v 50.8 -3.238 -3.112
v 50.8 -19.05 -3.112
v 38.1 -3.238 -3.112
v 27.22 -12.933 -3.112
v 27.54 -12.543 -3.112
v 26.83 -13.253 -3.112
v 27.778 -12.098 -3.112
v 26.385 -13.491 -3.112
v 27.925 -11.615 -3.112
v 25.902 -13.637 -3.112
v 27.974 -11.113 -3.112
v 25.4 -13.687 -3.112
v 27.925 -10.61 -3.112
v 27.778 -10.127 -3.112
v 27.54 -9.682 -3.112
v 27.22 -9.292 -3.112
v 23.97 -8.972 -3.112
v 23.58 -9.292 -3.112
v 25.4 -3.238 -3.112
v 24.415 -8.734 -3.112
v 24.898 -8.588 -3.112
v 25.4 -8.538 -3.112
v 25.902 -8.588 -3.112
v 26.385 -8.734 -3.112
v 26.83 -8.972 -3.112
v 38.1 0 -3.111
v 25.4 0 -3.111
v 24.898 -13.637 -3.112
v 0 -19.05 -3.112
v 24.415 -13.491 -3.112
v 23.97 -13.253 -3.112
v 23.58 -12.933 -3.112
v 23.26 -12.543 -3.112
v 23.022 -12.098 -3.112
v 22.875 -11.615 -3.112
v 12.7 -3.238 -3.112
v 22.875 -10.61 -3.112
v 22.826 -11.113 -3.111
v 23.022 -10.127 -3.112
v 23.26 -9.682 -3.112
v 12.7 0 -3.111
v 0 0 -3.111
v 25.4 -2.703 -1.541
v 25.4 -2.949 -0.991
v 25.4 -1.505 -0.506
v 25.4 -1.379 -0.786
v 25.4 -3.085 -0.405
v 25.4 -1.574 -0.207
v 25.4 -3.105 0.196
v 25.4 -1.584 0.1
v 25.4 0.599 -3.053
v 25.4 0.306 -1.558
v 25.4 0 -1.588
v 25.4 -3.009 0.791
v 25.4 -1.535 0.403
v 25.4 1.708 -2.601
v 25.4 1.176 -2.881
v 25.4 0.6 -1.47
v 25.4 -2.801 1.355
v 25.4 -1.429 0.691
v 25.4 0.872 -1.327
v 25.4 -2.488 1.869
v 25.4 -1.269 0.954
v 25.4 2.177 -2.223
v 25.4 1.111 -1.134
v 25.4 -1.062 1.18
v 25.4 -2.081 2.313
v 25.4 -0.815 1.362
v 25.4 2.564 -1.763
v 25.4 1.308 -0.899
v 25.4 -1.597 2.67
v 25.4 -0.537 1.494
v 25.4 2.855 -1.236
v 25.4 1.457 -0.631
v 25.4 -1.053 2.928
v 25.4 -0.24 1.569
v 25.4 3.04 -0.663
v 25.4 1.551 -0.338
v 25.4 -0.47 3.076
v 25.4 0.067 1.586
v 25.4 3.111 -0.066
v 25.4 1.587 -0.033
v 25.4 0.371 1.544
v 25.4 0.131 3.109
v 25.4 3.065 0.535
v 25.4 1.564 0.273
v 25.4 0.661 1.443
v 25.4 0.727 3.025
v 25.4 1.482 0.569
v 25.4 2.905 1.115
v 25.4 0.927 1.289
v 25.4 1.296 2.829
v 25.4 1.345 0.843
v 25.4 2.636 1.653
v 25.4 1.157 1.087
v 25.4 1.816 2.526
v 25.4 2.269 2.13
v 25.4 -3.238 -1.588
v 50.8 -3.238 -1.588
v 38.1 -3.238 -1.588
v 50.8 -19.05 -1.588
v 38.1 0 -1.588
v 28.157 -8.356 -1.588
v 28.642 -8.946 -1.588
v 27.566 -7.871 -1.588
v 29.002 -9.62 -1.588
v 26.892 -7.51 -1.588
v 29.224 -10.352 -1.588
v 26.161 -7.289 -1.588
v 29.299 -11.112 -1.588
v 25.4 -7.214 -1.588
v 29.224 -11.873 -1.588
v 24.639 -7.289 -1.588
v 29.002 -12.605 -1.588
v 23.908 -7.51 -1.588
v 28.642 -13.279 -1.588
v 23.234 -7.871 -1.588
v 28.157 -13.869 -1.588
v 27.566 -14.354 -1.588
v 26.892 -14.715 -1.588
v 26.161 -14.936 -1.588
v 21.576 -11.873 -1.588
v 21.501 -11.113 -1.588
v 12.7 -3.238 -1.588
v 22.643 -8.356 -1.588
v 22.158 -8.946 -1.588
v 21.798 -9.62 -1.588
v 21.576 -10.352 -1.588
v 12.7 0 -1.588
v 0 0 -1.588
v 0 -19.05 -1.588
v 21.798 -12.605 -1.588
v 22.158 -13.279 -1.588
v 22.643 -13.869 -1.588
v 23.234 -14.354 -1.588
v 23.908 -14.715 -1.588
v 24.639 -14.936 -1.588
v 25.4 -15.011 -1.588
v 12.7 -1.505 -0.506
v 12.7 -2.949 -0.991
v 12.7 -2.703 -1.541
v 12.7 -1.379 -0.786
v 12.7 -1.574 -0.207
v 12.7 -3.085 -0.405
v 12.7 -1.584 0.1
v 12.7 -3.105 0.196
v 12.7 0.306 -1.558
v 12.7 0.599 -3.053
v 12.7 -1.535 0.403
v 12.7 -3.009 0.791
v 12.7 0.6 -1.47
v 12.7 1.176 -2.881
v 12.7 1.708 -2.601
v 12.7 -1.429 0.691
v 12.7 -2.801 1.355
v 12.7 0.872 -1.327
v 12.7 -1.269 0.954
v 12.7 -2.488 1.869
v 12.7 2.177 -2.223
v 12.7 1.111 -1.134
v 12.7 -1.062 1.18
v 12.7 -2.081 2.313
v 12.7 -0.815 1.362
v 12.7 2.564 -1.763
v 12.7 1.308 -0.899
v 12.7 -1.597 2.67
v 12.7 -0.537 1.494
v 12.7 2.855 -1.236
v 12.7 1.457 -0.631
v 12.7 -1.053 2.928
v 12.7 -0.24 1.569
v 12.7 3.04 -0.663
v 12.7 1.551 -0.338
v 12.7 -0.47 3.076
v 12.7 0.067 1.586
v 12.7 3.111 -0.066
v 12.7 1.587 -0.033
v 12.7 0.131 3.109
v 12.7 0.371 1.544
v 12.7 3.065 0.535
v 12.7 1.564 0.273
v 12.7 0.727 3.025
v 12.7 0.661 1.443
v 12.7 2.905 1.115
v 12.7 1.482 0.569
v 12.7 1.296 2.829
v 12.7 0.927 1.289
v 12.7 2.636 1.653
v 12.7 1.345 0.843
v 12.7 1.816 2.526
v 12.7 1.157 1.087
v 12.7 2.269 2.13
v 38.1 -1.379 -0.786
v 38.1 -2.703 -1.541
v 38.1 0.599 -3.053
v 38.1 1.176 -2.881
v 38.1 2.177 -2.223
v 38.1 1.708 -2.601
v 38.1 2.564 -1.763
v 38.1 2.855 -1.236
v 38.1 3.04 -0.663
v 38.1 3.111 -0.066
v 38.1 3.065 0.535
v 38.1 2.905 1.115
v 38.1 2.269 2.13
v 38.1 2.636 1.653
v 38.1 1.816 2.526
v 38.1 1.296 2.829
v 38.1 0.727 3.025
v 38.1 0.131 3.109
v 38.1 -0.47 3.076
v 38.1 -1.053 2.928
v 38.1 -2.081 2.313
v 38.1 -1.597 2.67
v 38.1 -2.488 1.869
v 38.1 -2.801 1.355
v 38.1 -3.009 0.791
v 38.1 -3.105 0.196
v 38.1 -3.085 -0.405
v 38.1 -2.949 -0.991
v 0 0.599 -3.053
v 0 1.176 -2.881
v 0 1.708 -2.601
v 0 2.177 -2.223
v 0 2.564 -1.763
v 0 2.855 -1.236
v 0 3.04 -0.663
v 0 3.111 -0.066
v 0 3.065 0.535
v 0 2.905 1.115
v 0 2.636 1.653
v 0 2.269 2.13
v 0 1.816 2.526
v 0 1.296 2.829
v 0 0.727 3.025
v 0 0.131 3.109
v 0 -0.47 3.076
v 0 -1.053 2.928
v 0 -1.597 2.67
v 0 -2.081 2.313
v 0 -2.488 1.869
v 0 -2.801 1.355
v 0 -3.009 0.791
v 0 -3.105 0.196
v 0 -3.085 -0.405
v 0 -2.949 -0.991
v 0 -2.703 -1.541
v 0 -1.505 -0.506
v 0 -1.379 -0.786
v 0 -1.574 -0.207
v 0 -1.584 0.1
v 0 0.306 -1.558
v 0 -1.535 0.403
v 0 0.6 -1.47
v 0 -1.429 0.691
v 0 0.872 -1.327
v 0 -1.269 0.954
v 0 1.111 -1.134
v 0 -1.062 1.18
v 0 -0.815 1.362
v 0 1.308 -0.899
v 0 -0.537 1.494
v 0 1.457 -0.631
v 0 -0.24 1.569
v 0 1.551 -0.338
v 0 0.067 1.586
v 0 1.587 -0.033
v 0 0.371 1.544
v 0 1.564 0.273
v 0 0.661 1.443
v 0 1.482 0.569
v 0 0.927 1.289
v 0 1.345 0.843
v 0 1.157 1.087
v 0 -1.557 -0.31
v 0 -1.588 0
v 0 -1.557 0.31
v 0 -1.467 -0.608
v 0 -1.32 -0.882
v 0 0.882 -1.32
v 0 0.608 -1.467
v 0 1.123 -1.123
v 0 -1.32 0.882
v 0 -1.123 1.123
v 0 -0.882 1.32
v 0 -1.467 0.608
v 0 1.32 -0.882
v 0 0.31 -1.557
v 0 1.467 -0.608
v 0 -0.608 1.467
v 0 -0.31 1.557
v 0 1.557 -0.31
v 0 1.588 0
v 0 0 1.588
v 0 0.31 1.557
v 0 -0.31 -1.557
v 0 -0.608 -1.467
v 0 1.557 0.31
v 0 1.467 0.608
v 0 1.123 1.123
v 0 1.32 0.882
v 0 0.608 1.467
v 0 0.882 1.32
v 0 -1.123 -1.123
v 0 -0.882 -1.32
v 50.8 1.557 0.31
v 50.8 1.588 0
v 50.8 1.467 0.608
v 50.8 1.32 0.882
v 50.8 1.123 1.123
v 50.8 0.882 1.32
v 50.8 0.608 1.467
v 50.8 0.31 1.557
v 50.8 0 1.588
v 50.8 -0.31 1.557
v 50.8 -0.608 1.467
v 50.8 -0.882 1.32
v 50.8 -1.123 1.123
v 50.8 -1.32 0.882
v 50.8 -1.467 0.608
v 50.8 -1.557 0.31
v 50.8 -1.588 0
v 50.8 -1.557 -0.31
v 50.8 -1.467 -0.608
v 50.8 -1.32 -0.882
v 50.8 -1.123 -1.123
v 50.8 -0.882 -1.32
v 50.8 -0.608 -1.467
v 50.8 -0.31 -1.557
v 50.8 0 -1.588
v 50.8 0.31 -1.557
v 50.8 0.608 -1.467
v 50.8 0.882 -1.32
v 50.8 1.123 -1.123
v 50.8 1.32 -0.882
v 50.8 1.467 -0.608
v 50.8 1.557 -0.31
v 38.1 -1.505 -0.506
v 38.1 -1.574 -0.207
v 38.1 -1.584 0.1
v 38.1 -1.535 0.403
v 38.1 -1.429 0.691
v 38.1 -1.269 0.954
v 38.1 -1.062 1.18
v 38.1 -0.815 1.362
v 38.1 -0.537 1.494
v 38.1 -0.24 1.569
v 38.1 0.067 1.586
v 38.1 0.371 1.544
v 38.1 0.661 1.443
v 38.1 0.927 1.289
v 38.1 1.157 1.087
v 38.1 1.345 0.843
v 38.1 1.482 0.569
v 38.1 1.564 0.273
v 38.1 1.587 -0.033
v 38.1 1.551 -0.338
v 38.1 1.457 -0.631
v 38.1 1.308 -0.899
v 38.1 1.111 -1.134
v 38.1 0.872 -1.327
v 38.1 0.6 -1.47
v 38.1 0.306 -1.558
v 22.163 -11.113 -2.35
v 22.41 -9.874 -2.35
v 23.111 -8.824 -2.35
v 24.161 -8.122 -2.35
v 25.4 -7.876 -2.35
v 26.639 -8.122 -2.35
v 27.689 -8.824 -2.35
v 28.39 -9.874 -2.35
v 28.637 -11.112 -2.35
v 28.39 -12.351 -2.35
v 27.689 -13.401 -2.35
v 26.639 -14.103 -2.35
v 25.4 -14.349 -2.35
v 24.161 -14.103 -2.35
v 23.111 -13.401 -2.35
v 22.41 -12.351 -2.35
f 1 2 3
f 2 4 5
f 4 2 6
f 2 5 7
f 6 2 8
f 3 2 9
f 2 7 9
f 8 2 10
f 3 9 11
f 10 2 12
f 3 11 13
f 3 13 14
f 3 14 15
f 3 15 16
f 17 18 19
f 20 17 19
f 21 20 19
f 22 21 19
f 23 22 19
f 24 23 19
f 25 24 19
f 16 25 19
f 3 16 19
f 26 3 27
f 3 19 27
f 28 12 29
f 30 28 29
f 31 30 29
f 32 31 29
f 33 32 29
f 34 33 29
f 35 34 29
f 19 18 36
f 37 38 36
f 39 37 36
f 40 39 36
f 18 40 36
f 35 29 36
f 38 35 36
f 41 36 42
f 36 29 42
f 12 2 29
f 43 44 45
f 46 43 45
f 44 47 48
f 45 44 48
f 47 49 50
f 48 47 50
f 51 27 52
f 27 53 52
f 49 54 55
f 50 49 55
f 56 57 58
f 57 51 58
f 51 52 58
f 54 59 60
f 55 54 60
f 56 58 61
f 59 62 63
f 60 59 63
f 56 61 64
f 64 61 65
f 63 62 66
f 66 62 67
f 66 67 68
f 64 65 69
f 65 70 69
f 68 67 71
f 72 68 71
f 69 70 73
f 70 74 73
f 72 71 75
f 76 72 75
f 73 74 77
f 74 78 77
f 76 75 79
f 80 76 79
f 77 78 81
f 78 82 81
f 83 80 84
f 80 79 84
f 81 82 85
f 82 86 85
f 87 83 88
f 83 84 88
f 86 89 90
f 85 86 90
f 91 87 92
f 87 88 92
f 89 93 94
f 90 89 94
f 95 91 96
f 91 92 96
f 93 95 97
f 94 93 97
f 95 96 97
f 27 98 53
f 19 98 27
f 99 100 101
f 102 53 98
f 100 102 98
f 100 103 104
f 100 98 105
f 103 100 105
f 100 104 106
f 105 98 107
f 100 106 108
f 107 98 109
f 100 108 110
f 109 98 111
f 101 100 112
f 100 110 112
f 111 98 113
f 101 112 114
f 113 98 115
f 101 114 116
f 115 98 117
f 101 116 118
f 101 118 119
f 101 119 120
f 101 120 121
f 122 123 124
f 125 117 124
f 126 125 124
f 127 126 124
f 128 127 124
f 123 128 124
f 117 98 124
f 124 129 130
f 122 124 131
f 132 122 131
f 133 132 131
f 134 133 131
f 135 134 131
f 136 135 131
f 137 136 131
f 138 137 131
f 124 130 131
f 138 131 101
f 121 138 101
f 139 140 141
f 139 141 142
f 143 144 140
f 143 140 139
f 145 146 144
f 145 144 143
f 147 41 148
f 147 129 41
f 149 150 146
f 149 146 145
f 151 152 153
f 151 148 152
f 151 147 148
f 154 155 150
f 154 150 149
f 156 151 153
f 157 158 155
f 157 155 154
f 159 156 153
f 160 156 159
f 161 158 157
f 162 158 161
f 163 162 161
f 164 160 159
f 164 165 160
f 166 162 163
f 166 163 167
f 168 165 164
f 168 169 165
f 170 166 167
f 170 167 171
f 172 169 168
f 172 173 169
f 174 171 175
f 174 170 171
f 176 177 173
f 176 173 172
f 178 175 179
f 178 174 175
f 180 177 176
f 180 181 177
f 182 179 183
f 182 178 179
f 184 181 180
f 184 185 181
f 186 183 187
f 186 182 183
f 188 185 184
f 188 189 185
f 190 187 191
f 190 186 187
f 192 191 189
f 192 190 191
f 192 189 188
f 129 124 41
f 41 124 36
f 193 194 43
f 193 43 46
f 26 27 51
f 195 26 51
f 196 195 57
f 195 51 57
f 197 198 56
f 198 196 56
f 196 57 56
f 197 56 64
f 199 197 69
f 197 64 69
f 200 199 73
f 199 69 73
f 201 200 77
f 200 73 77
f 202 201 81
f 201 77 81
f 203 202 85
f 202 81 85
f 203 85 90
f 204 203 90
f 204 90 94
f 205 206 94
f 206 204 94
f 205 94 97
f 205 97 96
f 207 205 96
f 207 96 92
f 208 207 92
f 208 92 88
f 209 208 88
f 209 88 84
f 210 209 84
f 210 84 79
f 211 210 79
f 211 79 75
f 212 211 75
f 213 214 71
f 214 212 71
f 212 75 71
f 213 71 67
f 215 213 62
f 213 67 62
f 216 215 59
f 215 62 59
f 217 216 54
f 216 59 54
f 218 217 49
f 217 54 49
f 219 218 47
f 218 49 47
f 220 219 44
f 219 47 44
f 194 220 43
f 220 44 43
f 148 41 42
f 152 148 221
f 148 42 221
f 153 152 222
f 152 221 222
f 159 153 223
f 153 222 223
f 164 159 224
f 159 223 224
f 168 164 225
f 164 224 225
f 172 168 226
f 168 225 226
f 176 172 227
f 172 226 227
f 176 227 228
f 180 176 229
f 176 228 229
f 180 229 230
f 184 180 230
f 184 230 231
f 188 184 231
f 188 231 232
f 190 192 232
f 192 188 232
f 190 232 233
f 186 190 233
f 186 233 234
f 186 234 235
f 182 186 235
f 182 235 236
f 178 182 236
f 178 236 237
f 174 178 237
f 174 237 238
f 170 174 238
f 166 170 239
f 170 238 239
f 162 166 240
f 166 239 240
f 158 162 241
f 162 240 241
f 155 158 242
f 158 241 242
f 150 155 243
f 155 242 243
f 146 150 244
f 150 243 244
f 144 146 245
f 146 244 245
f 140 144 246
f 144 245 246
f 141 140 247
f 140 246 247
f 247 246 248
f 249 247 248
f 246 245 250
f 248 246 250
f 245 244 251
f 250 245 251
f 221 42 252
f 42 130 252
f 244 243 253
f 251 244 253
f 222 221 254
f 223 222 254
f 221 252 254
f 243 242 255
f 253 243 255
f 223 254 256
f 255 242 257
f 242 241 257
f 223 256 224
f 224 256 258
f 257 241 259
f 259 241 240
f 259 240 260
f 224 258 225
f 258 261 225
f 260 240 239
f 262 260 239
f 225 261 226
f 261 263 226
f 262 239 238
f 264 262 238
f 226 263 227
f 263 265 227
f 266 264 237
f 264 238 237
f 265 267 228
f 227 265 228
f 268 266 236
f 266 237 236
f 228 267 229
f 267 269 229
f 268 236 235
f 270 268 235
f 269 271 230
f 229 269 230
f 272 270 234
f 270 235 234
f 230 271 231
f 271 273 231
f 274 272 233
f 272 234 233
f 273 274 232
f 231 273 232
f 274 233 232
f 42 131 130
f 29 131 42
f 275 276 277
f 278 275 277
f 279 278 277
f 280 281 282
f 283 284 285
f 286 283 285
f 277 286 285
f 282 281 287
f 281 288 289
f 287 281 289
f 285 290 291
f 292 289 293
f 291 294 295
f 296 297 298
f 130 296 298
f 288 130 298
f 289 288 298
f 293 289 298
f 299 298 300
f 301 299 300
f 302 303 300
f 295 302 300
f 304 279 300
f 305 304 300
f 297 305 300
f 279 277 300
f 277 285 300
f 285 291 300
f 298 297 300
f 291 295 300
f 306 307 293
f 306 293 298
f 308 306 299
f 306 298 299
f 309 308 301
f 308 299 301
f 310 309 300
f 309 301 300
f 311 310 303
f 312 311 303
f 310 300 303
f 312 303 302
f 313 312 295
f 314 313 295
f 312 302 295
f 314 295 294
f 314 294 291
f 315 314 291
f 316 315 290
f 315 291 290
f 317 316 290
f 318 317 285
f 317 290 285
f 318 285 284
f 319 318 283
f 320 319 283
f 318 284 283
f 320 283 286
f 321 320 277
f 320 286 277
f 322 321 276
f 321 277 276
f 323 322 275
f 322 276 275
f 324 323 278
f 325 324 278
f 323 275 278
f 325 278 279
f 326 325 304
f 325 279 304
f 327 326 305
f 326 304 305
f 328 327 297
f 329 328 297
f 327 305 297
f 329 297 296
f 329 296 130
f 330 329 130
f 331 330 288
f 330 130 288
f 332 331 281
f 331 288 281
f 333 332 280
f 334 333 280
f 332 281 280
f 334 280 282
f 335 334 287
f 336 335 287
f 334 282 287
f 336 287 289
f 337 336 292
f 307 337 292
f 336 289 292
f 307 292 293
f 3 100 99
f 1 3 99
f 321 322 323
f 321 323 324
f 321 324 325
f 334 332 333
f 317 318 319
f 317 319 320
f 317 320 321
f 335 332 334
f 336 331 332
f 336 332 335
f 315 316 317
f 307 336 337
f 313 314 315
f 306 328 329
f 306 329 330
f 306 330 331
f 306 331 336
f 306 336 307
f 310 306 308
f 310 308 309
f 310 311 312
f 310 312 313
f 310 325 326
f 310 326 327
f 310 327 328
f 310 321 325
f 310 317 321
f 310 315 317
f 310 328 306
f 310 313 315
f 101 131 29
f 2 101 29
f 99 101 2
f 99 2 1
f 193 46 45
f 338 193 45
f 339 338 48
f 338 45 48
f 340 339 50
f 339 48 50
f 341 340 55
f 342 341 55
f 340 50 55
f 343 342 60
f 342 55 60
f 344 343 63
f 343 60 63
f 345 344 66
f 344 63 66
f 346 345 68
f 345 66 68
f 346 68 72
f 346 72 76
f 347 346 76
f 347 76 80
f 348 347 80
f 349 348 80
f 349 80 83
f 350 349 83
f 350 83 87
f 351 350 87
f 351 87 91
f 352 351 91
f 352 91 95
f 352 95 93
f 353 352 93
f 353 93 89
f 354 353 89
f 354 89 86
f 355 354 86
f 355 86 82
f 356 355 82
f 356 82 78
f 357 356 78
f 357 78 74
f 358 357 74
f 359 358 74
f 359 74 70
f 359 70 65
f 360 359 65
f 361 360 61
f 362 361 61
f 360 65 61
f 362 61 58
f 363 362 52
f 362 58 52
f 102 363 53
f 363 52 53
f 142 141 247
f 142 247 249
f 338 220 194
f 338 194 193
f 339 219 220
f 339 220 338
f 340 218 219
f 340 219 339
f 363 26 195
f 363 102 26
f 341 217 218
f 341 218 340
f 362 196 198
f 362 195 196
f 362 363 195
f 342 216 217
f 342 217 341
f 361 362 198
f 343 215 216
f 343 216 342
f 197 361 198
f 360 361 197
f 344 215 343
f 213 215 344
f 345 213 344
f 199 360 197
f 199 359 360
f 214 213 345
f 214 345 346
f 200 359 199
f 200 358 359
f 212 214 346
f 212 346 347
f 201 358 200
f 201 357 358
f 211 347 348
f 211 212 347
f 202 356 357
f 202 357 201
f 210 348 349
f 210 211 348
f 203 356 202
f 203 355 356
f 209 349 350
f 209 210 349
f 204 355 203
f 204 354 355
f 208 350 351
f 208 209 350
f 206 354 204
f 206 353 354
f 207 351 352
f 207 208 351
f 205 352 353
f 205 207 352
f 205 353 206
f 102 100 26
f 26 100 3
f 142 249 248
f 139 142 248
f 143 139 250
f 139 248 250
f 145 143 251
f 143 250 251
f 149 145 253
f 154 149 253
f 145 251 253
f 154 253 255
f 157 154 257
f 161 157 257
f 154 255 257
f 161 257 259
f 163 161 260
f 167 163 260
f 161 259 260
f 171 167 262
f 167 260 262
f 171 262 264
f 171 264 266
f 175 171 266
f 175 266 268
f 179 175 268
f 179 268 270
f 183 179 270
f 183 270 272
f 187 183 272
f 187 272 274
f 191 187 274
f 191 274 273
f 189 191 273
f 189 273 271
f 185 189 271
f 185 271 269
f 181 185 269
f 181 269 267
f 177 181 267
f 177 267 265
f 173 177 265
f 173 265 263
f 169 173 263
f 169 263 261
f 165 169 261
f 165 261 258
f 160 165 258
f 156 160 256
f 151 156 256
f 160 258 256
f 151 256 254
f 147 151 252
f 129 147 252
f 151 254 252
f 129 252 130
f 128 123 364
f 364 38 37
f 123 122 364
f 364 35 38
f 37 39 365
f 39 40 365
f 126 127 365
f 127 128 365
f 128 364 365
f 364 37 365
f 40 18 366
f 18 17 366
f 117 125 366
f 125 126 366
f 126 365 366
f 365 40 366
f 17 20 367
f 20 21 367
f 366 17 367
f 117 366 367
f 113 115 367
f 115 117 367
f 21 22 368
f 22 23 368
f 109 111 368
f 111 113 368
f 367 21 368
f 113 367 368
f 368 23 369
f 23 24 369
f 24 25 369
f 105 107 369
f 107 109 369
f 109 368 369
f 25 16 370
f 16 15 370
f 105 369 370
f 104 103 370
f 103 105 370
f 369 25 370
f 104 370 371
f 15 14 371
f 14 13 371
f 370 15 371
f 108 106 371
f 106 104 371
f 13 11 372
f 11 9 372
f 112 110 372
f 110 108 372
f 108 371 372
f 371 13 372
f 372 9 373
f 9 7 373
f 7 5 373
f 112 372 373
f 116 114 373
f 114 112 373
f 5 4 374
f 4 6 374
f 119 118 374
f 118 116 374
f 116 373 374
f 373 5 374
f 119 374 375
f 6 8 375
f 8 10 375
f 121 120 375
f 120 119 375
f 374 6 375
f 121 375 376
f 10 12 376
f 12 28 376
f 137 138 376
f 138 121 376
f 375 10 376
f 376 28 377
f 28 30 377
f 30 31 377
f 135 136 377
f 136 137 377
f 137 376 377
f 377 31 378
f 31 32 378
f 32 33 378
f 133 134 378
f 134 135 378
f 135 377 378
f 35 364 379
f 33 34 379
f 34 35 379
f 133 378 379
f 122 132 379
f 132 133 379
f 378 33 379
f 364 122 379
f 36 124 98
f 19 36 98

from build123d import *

# Parameters (mm, degrees)
F1_DEPTH       = 50.8
F2_W           = 12.7
F2_H           = 6.35
F3_DEPTH       = 3.1125
F3_DEPTH_BACK  = 3.1125
F5_D           = 3.6576
F5_CSINK_D     = 7.7978
F5_CSINK_ANGLE = 82
F6_R           = 1.5875
F7_DEPTH       = 50.8


with BuildPart() as f1:
    # F0 (on Right) → F1 (new body)
    with BuildSketch(Plane.YZ):
        with BuildLine():
            Line((-19.05, -3.1115), (0, -3.1115))
            ThreePointArc((0, -3.1115), (1.5633292388, 2.690247933), (-2.7033541721, -1.5405545982))
            Line((-2.7033541721, -1.5405545982), (-1.3792623327, -0.785997244))
            ThreePointArc((-1.3792623327, -0.785997244), (0.7976169586, 1.372575476), (0, -1.5875))
            Line((0, -1.5875), (-19.05, -1.5875))
            Line((-19.05, -1.5875), (-19.05, -3.1115))
        make_face()
    extrude(amount=F1_DEPTH)

    # F2 (on Top) → F3 (cut, two sides)
    with BuildSketch(Plane.XY) as f3_sk:
        with Locations((19.05, -0.0635)):
            Rectangle(F2_W, F2_H)
        with Locations((44.45, -0.0635)):
            Rectangle(F2_W, F2_H)
        with Locations((69.85, -0.0635)):
            Rectangle(F2_W, F2_H)
        with Locations((95.25, -0.0635)):
            Rectangle(F2_W, F2_H)
        with Locations((120.65, -0.0635)):
            Rectangle(F2_W, F2_H)
        with Locations((146.05, -0.0635)):
            Rectangle(F2_W, F2_H)
        with Locations((171.45, -0.0635)):
            Rectangle(F2_W, F2_H)
        with Locations((196.85, -0.0635)):
            Rectangle(F2_W, F2_H)
        with Locations((222.25, -0.0635)):
            Rectangle(F2_W, F2_H)
        with Locations((247.65, -0.0635)):
            Rectangle(F2_W, F2_H)
        with Locations((273.05, -0.0635)):
            Rectangle(F2_W, F2_H)
        with Locations((298.45, -0.0635)):
            Rectangle(F2_W, F2_H)
        with Locations((323.85, -0.0635)):
            Rectangle(F2_W, F2_H)
        with Locations((349.25, -0.0635)):
            Rectangle(F2_W, F2_H)
        with Locations((374.65, -0.0635)):
            Rectangle(F2_W, F2_H)
        with Locations((400.05, -0.0635)):
            Rectangle(F2_W, F2_H)
        with Locations((425.45, -0.0635)):
            Rectangle(F2_W, F2_H)
        with Locations((450.85, -0.0635)):
            Rectangle(F2_W, F2_H)
        with Locations((476.25, -0.0635)):
            Rectangle(F2_W, F2_H)
        with Locations((501.65, -0.0635)):
            Rectangle(F2_W, F2_H)
        with Locations((527.05, -0.0635)):
            Rectangle(F2_W, F2_H)
        with Locations((552.45, -0.0635)):
            Rectangle(F2_W, F2_H)
        with Locations((577.85, -0.0635)):
            Rectangle(F2_W, F2_H)
        with Locations((603.25, -0.0635)):
            Rectangle(F2_W, F2_H)
        with Locations((628.65, -0.0635)):
            Rectangle(F2_W, F2_H)
        with Locations((654.05, -0.0635)):
            Rectangle(F2_W, F2_H)
        with Locations((679.45, -0.0635)):
            Rectangle(F2_W, F2_H)
        with Locations((704.85, -0.0635)):
            Rectangle(F2_W, F2_H)
        with Locations((730.25, -0.0635)):
            Rectangle(F2_W, F2_H)
        with Locations((755.65, -0.0635)):
            Rectangle(F2_W, F2_H)
    extrude(amount=-F3_DEPTH, mode=Mode.SUBTRACT)
    extrude(f3_sk.sketch, amount=F3_DEPTH_BACK, mode=Mode.SUBTRACT)

    # F5 (through all)
    with Locations(Plane.XY.offset(-1.5875)):
        with Locations((25.4, -11.1125)):
            CounterSinkHole(F5_D / 2, F5_CSINK_D / 2, counter_sink_angle=F5_CSINK_ANGLE)


with BuildPart() as f7:
    # F6 (on Right) → F7 (new body, through all)
    with BuildSketch(Plane.YZ):
        Circle(F6_R)
    extrude(amount=F7_DEPTH)


solid = Compound([f1.part, f7.part])
